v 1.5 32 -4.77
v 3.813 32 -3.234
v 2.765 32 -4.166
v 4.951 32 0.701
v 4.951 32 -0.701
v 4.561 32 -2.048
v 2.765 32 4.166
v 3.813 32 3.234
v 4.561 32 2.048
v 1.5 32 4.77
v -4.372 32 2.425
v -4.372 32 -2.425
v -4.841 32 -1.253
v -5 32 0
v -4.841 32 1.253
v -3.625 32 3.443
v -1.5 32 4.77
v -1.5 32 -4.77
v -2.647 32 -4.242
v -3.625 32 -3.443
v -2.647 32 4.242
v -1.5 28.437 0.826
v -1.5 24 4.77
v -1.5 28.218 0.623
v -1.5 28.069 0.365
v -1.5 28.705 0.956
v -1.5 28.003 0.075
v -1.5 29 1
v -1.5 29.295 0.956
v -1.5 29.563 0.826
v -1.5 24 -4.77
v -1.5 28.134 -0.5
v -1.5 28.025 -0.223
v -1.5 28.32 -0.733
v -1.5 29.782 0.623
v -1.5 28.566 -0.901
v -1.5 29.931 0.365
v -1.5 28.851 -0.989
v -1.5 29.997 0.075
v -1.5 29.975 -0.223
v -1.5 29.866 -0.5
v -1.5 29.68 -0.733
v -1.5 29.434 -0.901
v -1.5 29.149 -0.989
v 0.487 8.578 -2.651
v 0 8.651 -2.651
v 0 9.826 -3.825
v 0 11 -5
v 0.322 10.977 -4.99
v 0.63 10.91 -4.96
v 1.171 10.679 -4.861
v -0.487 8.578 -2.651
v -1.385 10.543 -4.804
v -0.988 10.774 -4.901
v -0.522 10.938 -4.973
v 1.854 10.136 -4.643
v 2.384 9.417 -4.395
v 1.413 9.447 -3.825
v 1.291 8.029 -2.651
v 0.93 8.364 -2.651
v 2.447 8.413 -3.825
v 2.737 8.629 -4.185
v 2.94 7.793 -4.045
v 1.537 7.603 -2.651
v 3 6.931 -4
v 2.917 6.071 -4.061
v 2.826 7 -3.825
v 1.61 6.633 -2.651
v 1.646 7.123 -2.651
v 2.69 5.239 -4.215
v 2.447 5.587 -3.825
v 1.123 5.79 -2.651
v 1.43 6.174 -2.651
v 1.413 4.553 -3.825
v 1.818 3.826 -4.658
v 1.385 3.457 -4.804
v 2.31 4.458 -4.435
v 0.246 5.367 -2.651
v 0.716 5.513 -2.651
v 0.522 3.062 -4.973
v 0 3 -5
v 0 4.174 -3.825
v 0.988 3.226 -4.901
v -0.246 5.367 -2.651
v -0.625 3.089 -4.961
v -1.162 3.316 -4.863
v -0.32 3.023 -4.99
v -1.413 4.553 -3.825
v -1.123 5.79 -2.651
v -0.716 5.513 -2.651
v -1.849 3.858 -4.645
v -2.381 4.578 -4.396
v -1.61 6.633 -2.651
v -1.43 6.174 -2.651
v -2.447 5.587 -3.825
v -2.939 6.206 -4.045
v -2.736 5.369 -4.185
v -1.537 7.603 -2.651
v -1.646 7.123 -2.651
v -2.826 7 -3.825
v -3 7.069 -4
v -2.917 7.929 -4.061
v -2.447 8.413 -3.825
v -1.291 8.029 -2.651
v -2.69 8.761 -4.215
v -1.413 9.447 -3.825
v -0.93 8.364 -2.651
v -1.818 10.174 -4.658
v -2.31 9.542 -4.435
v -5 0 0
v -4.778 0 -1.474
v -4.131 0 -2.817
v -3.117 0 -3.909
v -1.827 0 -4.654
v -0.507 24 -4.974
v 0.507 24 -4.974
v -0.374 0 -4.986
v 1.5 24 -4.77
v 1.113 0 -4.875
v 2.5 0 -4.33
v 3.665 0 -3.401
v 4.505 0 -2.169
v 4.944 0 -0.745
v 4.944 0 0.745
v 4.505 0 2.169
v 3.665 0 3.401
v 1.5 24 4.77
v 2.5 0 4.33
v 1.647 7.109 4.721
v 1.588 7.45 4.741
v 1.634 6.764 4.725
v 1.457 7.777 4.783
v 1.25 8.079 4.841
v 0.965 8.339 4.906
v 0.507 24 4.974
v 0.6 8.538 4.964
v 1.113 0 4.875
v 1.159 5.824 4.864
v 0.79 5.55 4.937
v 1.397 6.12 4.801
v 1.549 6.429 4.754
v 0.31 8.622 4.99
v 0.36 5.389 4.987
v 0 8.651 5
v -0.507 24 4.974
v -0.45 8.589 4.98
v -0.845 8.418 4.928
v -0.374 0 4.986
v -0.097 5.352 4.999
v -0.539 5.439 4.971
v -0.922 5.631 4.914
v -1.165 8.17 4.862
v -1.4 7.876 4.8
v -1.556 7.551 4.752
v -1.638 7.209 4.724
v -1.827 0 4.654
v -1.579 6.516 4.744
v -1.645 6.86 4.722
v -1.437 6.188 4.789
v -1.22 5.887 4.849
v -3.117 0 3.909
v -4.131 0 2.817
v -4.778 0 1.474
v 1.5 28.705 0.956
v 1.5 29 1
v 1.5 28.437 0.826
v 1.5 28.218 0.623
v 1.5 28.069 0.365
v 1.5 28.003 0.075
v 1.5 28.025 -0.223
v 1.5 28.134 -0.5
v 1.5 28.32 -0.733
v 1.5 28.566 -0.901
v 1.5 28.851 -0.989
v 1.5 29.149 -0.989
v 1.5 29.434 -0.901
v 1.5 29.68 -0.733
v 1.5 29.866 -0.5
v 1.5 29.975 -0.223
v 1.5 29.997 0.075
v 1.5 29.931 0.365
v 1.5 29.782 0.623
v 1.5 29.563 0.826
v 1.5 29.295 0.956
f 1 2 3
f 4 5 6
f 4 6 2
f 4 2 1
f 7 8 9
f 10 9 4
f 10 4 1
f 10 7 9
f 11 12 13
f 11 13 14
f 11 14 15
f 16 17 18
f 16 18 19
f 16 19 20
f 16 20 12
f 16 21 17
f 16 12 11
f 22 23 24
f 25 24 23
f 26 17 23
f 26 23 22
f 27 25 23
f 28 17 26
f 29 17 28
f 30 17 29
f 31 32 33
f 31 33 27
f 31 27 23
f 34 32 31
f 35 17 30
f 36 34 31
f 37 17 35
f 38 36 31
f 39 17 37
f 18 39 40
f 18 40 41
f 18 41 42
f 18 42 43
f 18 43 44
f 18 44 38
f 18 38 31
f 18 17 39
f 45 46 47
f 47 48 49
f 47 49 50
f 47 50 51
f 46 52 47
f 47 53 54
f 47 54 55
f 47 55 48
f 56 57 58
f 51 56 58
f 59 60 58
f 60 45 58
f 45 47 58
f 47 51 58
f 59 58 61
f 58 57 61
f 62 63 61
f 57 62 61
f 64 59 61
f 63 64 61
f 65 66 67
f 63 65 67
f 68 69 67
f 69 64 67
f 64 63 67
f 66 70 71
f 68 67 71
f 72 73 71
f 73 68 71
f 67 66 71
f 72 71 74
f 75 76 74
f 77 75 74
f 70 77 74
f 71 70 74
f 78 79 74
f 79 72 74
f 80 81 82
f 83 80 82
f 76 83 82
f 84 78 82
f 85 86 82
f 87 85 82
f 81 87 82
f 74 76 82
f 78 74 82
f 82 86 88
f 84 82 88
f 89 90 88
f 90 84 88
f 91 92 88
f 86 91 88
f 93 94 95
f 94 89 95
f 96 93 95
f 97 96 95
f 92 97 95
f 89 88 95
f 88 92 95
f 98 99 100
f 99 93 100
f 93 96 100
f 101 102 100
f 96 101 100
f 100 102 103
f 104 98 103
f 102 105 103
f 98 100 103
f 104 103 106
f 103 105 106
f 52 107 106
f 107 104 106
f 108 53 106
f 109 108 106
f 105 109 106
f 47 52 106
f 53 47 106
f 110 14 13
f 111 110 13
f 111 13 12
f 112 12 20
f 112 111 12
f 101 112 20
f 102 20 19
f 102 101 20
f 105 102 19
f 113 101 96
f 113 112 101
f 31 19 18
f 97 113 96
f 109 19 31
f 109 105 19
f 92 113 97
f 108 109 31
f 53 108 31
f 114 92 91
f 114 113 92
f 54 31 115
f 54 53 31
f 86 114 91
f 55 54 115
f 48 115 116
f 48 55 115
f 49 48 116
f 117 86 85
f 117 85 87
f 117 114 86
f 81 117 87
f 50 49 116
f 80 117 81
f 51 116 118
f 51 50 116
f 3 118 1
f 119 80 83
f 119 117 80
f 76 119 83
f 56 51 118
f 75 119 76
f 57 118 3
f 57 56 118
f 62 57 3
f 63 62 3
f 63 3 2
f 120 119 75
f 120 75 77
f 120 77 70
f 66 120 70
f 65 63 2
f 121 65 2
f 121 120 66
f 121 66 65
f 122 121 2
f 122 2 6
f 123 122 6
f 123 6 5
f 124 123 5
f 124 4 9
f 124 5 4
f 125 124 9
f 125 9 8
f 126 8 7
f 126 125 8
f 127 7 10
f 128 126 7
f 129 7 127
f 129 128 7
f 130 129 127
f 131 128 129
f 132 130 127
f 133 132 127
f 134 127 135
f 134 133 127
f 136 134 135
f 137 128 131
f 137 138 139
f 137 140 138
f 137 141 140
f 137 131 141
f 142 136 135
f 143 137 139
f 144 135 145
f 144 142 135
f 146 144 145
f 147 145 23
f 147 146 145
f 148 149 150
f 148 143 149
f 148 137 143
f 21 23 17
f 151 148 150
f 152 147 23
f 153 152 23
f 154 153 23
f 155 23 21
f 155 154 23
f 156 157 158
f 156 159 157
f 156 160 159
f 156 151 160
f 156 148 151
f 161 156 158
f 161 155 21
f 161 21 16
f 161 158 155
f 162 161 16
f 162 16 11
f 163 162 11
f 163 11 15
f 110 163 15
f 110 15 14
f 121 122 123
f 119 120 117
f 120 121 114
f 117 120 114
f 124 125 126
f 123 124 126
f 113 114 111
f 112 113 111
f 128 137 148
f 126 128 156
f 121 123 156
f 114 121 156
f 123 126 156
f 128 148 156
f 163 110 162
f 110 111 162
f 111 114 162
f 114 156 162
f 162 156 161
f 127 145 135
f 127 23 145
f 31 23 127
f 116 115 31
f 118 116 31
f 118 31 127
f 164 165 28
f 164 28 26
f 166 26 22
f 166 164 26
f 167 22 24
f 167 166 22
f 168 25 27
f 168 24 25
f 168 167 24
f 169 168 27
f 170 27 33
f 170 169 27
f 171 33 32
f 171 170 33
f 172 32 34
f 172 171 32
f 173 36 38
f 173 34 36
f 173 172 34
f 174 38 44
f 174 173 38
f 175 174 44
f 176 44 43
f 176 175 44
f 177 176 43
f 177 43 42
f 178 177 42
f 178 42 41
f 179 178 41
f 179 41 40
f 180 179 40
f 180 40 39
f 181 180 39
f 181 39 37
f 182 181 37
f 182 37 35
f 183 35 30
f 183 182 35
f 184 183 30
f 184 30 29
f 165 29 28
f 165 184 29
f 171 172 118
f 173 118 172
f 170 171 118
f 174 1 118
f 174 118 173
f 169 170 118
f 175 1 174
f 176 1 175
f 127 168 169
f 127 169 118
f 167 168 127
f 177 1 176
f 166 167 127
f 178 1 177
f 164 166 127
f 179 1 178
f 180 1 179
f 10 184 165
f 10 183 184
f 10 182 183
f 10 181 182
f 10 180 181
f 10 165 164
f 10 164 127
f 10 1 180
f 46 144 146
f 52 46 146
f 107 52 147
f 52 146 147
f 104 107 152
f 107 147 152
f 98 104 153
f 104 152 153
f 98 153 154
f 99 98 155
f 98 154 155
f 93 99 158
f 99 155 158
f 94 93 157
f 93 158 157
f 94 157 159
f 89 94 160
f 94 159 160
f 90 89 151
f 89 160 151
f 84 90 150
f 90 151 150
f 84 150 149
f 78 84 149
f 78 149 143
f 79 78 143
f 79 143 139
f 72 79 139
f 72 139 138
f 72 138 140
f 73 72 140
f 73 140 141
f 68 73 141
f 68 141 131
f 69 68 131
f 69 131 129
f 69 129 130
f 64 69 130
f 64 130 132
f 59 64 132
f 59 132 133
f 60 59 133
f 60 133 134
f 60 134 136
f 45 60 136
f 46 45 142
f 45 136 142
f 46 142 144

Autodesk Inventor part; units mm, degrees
ref_plane "YZ Plane" through (0, 0, 0) normal (1, 0, 0) x (0, 1, 0)
ref_plane "XZ Plane" through (0, 0, 0) normal (0, 1, 0) x (-1, 0, 0)
sketch "Sketch1" plane through (0, 0, 0) normal (0, 1, 0) x (-1, 0, 0)
  circle A0 centre (0, 0) radius 5
  dimension "d0" = 10
extrude "Extrusion1" add sketch "Sketch1" along normal blind 32
sketch "Sketch2" plane through (0, 32, 0) normal (0, 1, 0) x (1, 0, 0)
  line L0 (-1.5, 5) -> (1.5, 5)
  line L1 (1.5, 5) -> (1.5, -5)
  line L2 (1.5, -5) -> (-1.5, -5)
  line L3 (-1.5, -5) -> (-1.5, 5)
  point P0 (0, 0)
  point P1 (-1.5, 0)
  point P2 (0, 5)
  dimension "d3" = 3
  dimension "d4" = 10
extrude "Extrusion2" cut sketch "Sketch2" against normal blind 8
sketch "Sketch3" plane through (1.5, 32, -4.7697) normal (-1, 0, 0) x (0, 0, 1)
  circle A0 centre (4.7697, -3) radius 1
  line L0 (9.5394, 0) -> (0, 0) projected
  point P0 (4.7697, -32)
  point P1 (4.7697, 0)
  dimension "d7" = 2
  dimension "d8" = 3
extrude "Extrusion3" add sketch "Sketch3" along normal blind 3
ref_plane "Work Plane1" through (0, 0, -5) normal (0, 0, 1) x (1, 0, 0)
sketch "Sketch5" plane through (0, 0, -5) normal (0, 0, 1) x (1, 0, 0)
  point P0 (0, 0)
  point P1 (0, 7)
  dimension "d14" = 7
hole "Hole1" at (0, 7, -5) direction (0, 0, 1) diameter 3.302 end through all countersink diameter 8 countersink angle 90 thread size "8-32 UNC" class "2B" standard "ANSI Unified Screw Threads"
equation "\"d20\" = Thickness"
equation "\"BendRadius\" = Thickness"
equation "\"BendReliefWidth\" = Thickness"
equation "\"BendReliefDepth\" = 0.5 * Thickness"
equation "\"CornerReliefSize\" = 4 * Thickness"
equation "\"MinimumRemnant\" = 2 * Thickness"
equation "\"TransitionRadius\" = BendRadius"
equation "\"JacobiRadiusSize\" = BendRadius"
equation "\"GapSize\" = Thickness"
equation "\"Thickness\" = 3.048"
properties part number "barrel_hinge-female" material "Stainless Steel"
